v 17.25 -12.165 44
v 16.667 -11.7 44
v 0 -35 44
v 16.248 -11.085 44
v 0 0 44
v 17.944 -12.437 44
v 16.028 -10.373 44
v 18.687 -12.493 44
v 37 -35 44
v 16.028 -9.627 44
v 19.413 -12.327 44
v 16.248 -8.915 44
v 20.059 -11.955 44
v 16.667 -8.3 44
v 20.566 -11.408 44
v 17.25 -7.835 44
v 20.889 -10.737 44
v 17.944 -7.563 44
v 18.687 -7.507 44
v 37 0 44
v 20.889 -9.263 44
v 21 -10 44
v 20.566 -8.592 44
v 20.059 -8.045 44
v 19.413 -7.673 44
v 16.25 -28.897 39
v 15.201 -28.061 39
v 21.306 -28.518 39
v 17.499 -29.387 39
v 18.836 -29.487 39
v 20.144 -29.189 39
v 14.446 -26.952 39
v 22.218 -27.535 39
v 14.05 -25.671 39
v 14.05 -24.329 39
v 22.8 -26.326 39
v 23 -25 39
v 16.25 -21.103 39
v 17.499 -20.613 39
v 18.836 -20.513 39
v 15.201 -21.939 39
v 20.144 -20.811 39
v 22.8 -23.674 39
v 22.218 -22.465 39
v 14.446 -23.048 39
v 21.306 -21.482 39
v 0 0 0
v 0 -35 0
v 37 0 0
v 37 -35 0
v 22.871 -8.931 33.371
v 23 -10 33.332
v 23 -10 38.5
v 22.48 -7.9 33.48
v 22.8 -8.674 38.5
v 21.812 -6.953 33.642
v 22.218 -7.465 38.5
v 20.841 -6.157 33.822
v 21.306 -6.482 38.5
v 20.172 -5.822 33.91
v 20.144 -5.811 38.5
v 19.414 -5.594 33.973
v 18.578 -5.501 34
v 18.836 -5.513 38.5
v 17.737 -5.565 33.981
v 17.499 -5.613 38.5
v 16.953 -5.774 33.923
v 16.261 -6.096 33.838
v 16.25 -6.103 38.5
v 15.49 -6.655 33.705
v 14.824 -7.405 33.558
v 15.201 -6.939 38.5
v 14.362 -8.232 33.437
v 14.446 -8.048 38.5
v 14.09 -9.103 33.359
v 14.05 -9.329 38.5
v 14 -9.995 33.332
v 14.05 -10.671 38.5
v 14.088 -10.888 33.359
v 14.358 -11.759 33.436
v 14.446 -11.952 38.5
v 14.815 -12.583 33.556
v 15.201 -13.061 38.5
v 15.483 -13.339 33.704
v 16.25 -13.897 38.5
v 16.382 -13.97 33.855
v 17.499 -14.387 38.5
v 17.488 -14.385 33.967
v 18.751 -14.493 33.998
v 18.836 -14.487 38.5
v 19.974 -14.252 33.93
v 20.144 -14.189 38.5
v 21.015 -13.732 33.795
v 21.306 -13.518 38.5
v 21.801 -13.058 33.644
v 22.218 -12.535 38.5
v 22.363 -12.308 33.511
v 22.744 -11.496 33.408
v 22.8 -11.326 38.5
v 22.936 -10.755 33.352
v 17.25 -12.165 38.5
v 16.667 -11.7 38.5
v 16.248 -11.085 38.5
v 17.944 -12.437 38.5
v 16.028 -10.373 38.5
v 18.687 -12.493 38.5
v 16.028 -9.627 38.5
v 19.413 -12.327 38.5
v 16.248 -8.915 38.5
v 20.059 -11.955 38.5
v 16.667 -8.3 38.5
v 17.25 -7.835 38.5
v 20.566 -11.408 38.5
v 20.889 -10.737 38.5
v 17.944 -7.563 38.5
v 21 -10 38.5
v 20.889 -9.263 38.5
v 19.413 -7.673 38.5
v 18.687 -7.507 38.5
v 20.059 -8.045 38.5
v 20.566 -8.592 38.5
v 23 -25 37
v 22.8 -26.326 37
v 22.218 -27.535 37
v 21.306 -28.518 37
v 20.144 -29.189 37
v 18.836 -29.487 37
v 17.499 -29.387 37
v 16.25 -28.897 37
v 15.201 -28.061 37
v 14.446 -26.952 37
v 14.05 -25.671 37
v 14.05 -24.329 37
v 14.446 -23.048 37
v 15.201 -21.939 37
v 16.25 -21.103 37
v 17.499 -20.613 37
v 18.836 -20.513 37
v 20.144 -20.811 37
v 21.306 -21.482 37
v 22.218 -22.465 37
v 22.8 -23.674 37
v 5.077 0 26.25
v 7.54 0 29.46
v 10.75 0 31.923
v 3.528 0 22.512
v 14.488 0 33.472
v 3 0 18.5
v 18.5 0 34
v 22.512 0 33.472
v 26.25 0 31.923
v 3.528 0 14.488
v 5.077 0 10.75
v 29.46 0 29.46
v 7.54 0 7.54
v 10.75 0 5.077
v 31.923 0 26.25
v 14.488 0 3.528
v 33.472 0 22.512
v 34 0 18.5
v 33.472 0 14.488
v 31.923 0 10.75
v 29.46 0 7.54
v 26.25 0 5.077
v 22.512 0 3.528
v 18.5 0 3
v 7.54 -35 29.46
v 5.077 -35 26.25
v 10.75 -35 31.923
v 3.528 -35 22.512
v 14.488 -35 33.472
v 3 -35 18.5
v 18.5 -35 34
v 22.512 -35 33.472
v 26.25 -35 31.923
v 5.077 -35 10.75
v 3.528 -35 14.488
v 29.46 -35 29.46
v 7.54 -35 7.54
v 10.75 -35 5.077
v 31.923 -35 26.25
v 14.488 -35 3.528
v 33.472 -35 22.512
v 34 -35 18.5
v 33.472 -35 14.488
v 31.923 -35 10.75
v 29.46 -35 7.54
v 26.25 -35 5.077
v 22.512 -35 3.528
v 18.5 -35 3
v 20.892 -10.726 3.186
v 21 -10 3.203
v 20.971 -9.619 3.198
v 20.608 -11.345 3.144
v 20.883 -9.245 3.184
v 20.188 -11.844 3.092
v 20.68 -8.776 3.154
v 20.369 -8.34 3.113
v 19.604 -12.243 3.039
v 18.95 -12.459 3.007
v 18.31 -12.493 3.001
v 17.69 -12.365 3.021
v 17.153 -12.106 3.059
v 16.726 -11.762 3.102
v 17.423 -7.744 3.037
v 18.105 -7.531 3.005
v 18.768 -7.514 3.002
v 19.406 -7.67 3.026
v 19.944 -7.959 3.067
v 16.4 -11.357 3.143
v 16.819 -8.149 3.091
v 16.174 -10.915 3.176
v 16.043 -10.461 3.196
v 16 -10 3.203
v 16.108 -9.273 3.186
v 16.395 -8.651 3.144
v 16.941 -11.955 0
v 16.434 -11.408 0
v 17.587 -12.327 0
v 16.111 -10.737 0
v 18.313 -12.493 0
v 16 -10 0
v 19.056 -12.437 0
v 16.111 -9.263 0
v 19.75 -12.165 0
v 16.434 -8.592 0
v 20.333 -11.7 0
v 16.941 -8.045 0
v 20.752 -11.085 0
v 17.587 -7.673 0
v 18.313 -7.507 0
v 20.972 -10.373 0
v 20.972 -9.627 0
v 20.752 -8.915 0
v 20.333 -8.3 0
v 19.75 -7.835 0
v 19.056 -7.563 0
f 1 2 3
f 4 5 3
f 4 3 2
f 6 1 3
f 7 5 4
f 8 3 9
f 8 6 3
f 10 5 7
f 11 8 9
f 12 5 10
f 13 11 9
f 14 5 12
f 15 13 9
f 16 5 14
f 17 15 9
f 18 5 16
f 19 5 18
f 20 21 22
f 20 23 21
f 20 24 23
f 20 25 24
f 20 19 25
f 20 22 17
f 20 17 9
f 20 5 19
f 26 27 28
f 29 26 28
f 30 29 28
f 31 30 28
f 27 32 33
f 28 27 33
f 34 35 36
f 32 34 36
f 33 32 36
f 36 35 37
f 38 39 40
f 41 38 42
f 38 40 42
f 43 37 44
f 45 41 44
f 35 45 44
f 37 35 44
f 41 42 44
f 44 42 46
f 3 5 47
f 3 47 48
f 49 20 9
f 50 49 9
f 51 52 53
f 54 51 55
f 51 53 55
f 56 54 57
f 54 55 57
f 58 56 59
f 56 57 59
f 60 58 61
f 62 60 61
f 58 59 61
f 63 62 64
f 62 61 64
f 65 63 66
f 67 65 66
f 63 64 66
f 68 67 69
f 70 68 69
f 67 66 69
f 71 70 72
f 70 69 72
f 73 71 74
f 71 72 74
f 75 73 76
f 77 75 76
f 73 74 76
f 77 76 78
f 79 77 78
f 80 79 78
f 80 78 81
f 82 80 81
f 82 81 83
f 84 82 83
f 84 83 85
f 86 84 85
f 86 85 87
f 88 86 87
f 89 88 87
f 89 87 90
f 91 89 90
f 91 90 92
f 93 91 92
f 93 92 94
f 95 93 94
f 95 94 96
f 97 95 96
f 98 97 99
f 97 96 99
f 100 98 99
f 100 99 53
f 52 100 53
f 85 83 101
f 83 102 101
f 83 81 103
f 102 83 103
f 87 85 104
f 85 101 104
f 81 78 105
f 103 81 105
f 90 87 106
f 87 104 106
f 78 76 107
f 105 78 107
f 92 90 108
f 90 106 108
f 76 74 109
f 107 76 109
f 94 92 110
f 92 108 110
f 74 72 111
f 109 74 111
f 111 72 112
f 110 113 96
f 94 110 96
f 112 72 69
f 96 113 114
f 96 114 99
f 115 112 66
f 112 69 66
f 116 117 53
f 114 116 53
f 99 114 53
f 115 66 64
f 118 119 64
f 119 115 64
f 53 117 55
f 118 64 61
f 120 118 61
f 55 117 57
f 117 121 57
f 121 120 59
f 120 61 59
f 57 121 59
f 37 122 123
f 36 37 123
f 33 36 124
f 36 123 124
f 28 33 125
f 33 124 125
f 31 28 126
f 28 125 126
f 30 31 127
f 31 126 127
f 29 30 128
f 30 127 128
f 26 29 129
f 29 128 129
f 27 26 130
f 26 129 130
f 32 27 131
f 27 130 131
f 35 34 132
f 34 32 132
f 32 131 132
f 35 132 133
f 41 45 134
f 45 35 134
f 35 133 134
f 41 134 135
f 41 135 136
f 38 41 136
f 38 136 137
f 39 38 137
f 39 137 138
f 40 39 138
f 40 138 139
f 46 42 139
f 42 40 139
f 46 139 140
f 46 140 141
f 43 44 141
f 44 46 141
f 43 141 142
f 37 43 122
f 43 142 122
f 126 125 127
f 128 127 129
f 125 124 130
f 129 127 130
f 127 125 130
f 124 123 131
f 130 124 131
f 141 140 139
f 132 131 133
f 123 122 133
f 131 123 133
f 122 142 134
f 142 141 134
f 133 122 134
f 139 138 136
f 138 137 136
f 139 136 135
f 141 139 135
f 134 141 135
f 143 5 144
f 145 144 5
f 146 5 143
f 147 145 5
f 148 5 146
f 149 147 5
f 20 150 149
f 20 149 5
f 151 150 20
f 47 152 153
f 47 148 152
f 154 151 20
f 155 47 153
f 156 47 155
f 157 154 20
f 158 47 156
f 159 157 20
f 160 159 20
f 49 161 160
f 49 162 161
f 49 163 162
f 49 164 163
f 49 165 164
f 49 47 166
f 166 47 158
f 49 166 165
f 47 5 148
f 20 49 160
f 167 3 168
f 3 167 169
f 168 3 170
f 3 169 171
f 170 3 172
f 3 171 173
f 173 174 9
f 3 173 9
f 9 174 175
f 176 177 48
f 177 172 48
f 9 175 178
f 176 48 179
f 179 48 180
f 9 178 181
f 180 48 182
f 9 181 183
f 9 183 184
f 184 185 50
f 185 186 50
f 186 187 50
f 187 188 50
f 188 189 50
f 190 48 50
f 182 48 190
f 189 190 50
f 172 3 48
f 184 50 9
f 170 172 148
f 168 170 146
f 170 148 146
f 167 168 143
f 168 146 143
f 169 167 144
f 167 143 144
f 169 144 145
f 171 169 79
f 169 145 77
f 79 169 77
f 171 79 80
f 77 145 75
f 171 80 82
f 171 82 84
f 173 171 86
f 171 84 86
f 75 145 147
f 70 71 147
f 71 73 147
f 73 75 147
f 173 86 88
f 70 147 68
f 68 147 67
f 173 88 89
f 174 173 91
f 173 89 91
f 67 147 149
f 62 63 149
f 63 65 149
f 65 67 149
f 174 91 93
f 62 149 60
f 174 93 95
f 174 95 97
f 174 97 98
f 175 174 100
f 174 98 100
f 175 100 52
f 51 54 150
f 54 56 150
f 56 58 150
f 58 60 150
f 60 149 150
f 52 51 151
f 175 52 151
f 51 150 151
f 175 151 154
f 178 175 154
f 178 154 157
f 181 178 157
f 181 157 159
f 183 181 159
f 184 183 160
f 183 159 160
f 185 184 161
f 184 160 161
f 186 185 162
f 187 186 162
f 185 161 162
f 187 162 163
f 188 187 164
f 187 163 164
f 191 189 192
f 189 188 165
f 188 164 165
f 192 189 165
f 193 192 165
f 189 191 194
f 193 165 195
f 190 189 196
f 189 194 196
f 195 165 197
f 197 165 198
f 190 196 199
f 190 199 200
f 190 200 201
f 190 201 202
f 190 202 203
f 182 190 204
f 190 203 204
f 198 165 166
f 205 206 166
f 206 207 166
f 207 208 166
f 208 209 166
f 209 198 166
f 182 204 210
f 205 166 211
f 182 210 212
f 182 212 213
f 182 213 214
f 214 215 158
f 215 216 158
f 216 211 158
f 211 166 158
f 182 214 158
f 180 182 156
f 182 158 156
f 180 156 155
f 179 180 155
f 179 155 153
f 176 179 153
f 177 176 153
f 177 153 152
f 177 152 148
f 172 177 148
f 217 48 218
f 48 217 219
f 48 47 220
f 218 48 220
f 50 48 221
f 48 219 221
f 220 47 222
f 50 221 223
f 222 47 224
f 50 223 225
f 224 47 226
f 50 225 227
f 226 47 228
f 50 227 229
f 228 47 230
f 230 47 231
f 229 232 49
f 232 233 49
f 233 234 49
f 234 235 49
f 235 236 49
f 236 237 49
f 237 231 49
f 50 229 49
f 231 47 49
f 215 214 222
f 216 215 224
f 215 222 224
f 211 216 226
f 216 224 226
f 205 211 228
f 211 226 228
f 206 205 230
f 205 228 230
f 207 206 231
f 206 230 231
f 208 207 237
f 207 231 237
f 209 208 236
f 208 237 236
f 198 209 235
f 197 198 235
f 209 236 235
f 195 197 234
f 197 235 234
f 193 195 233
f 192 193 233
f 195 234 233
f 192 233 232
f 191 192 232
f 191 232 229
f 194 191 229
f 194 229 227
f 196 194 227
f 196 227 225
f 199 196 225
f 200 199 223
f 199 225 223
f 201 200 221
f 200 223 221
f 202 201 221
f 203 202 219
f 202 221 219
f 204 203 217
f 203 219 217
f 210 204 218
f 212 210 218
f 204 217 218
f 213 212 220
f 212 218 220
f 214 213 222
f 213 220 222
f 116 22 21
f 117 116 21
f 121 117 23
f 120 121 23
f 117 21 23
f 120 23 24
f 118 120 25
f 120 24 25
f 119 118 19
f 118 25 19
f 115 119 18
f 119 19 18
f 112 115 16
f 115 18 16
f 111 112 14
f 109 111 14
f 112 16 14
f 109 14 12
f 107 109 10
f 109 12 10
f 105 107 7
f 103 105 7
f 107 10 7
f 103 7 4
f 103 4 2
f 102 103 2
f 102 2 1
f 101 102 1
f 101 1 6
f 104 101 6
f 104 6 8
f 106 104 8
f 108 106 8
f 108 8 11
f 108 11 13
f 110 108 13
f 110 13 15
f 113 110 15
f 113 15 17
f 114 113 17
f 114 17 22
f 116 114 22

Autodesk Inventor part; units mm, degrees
ref_plane "YZ Plane" through (0, 0, 0) normal (1, 0, 0) x (0, 1, 0)
ref_plane "XZ Plane" through (0, 0, 0) normal (0, 1, 0) x (-1, 0, 0)
ref_plane "XY Plane" through (0, 0, 0) normal (0, 0, 1) x (1, 0, 0)
sketch "Sketch1" plane through (0, 0, 0) normal (0, 1, 0) x (-1, 0, 0)
  line L0 (0, 0) -> (-37, 0)
  line L1 (-37, 0) -> (-37, 37)
  line L2 (-37, 37) -> (0, 37)
  line L3 (0, 37) -> (0, 0)
  circle A0 centre (-18.5, 18.5) radius 15.5
  point P0 (-18.5, 0)
  dimension "d0" = 37
  dimension "d1" = 37
  dimension "d2" = 18.5
  dimension "d3" = 18.5
  dimension "d4" = 31
extrude "Extrusion1" add sketch "Sketch1" against normal blind 35
sketch "Sketch3" plane through (0, 0, 37) normal (0, 0, 1) x (1, 0, 0)
  circle A0 centre (18.5, -10) radius 4.5
  line L0 (37, 0) -> (37, -35) projected
  point P0 (0, 0)
  dimension "d8" = 9
  dimension "d18" = 18.5
extrude "Extrusion2" cut sketch "Sketch3" along normal mid plane 5
sketch "Sketch4" plane through (37, 0, 0) normal (0, 0, -1) x (-1, 0, 0)
  circle A0 centre (18.5, -10) radius 4.5 projected
  circle A1 centre (18.5, -10) radius 2.5
  point P0 (37, 0)
  dimension "d11" = 5
extrude "Extrusion3" cut sketch "Sketch4" against normal blind 5 contours A1
sketch "Sketch5" plane through (0, 0, 37) normal (0, 0, 1) x (1, 0, 0)
  line L0 (37, 0) -> (0, 0) projected
  line L1 (0, -35) -> (37, -35) projected
  line L2 (0, 0) -> (37, 0)
  line L3 (37, 0) -> (37, -35)
  line L4 (37, -35) -> (0, -35)
  line L5 (0, -35) -> (0, 0)
  line L6 (0, 0) -> (0, -35) projected
  line L7 (0, 0) -> (37, 0)
  line L8 (37, 0) -> (37, -35)
  line L9 (37, -35) -> (0, -35)
  line L10 (0, -35) -> (0, 0)
  circle A0 centre (18.5, -25) radius 4.5
  dimension "d19" = 18.5
  dimension "d22" = 10
extrude "Extrusion4" add sketch "Sketch5" along normal blind 2
sketch "Sketch6" plane through (0, 0, 39) normal (0, 0, 1) x (1, 0, 0)
  line L0 (0, 0) -> (0, -35) projected
  line L1 (0, -35) -> (37, -35) projected
  line L2 (0, 0) -> (37, 0)
  line L3 (37, 0) -> (37, -35)
  line L4 (37, -35) -> (0, -35)
  line L5 (0, -35) -> (0, 0)
extrude "Extrusion5" add sketch "Sketch6" along normal blind 5
sketch "Sketch7" plane through (0, 0, 44) normal (0, 0, 1) x (1, 0, 0)
  circle A0 centre (18.5, -10) radius 2.5
  line L0 (37, 0) -> (0, 0) projected
  line L1 (37, -35) -> (37, 0) projected
  point P0 (18.5, 0)
  dimension "d24" = 5
  dimension "d25" = 10
  dimension "d26" = 18.5
extrude "Extrusion6" cut sketch "Sketch7" against normal through all
sketch "Sketch8" plane through (18.5, -10, 34.5) normal (0, 0, 1) x (1, 0, 0)
  circle A0 centre (0, 0) radius 2.5 projected
  circle A1 centre (0, 0) radius 4.5
  point P0 (-18.5, 10)
extrude "Extrusion7" cut sketch "Sketch8" along normal mid plane 8
equation "\"d0\" = d1"
equation "\"d2\" = 0.5 * d1"
equation "\"d3\" = 0.5 * d0"
properties part number "pump mount v04"
